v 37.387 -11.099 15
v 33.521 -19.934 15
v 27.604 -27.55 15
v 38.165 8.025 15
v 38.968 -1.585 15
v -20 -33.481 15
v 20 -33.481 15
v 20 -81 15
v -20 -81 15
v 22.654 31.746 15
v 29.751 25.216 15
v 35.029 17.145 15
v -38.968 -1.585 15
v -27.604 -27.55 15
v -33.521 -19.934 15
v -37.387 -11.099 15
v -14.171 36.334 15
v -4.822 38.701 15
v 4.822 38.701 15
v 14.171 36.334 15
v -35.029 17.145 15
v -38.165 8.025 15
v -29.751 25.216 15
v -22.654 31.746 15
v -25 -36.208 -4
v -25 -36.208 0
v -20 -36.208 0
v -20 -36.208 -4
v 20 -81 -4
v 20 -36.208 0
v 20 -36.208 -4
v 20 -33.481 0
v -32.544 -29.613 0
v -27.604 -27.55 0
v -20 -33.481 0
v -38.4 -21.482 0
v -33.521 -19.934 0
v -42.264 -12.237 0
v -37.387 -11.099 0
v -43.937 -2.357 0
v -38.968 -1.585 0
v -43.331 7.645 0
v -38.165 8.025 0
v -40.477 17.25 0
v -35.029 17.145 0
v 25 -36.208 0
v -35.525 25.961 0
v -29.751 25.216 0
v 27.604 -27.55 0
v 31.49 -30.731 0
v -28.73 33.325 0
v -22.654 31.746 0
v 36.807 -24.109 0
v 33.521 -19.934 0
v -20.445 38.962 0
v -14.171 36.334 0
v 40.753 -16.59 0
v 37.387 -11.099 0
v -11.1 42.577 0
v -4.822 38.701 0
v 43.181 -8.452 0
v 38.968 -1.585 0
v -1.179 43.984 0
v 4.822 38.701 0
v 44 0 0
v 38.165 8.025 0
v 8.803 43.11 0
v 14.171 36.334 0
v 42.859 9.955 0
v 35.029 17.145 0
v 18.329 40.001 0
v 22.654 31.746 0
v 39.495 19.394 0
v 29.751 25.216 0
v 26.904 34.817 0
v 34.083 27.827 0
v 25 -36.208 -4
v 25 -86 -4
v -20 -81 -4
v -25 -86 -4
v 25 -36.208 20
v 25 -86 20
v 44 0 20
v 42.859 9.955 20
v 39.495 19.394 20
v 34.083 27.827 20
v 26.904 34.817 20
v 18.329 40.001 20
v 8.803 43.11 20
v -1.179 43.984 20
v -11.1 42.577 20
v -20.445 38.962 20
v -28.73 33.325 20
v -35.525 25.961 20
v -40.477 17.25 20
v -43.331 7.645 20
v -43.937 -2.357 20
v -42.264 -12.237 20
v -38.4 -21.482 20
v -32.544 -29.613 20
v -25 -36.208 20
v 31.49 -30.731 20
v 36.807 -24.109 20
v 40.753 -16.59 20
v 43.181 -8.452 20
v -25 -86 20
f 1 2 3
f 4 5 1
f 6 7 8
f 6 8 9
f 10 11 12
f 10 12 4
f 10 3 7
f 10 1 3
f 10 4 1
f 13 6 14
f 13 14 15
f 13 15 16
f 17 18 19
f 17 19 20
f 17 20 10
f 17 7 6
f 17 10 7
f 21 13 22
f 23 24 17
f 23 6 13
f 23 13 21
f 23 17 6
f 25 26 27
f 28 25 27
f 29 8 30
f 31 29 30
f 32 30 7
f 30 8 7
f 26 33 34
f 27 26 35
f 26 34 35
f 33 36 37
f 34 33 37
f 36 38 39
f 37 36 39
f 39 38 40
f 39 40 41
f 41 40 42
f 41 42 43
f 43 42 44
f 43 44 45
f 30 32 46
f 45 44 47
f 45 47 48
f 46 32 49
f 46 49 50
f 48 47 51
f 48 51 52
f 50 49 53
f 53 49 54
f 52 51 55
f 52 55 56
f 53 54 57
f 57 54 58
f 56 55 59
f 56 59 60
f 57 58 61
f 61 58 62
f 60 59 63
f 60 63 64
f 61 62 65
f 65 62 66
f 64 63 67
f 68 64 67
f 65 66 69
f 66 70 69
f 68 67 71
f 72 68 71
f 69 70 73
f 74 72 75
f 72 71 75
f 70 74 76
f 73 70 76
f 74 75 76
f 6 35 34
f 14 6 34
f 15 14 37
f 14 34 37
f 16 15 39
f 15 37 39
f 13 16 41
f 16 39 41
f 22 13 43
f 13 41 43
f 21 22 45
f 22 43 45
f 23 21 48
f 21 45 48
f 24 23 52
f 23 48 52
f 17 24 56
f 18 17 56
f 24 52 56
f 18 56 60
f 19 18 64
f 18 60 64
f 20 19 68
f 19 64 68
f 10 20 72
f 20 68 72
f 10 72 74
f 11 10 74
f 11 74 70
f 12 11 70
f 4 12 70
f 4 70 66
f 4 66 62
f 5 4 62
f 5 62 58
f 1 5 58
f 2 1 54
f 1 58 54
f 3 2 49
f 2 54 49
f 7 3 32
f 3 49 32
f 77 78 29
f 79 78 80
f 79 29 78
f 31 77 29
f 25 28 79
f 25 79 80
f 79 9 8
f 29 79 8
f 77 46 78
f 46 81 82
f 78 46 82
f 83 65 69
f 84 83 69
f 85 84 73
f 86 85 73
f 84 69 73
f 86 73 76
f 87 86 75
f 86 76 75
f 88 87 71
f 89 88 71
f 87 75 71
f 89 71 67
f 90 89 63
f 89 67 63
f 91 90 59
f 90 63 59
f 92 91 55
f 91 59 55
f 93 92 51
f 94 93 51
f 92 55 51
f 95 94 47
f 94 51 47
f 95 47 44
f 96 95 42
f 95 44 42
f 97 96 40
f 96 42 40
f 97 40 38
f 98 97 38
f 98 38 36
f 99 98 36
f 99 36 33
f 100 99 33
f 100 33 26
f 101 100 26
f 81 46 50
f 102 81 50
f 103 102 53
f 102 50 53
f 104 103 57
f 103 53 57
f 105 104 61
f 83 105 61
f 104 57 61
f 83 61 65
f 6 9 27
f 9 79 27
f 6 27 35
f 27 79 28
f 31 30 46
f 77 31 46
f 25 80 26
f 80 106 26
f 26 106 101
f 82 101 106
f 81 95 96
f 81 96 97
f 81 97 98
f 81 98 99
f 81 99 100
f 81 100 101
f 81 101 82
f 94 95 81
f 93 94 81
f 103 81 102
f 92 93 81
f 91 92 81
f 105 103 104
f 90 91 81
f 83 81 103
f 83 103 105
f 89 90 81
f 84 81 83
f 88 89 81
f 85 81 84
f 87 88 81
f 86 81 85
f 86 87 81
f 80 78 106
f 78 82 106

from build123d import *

# Parameters (mm, degrees)
BOSS_EXTRUDE1_DEPTH = 20
CUT_EXTRUDE1_DEPTH  = 15
BOSS_EXTRUDE2_DEPTH = 4


with BuildPart() as part:
    # Sketch2 → Boss-Extrude1 (new body)
    with BuildSketch(Plane.XY):
        with BuildLine():
            ThreePointArc((44, 0), (-20.4450483, 38.961519478), (-25, -36.20773398))
            ThreePointArc((-25, -36.20773398), (0, -44), (25, -36.20773398))
            ThreePointArc((25, -36.20773398), (38.961519478, -20.4450483), (44, 0))
        make_face()
        with BuildLine():
            ThreePointArc((-25, -36.20773398), (0, -44), (25, -36.20773398))
            Line((25, -36.20773398), (25, -86))
            Line((25, -86), (-25, -86))
            Line((-25, -86), (-25, -36.20773398))
        make_face()
    extrude(amount=BOSS_EXTRUDE1_DEPTH)

    # Sketch3 → Cut-Extrude1 (cut)
    with BuildSketch(Plane(origin=(0, 0, 0), x_dir=(-1, 0, 0), z_dir=(0, 0, -1))):
        with BuildLine():
            Line((-20, -33.481338086), (-20, -81))
            Line((-20, -81), (20, -81))
            Line((20, -81), (20, -33.481338086))
            ThreePointArc((20, -33.481338086), (0, 39), (-20, -33.481338086))
        make_face()
    extrude(amount=-CUT_EXTRUDE1_DEPTH, mode=Mode.SUBTRACT)

    # Sketch4 → Boss-Extrude2 (add)
    with BuildSketch(Plane(origin=(0, 0, 0), x_dir=(-1, 0, 0), z_dir=(0, 0, -1))):
        Polygon((-20, -36.20773398), (-25, -36.20773398), (-25, -86), (25, -86), (25, -36.20773398), (20, -36.20773398), (20, -81), (-20, -81), align=None)
    extrude(amount=BOSS_EXTRUDE2_DEPTH)


solid = part.part
